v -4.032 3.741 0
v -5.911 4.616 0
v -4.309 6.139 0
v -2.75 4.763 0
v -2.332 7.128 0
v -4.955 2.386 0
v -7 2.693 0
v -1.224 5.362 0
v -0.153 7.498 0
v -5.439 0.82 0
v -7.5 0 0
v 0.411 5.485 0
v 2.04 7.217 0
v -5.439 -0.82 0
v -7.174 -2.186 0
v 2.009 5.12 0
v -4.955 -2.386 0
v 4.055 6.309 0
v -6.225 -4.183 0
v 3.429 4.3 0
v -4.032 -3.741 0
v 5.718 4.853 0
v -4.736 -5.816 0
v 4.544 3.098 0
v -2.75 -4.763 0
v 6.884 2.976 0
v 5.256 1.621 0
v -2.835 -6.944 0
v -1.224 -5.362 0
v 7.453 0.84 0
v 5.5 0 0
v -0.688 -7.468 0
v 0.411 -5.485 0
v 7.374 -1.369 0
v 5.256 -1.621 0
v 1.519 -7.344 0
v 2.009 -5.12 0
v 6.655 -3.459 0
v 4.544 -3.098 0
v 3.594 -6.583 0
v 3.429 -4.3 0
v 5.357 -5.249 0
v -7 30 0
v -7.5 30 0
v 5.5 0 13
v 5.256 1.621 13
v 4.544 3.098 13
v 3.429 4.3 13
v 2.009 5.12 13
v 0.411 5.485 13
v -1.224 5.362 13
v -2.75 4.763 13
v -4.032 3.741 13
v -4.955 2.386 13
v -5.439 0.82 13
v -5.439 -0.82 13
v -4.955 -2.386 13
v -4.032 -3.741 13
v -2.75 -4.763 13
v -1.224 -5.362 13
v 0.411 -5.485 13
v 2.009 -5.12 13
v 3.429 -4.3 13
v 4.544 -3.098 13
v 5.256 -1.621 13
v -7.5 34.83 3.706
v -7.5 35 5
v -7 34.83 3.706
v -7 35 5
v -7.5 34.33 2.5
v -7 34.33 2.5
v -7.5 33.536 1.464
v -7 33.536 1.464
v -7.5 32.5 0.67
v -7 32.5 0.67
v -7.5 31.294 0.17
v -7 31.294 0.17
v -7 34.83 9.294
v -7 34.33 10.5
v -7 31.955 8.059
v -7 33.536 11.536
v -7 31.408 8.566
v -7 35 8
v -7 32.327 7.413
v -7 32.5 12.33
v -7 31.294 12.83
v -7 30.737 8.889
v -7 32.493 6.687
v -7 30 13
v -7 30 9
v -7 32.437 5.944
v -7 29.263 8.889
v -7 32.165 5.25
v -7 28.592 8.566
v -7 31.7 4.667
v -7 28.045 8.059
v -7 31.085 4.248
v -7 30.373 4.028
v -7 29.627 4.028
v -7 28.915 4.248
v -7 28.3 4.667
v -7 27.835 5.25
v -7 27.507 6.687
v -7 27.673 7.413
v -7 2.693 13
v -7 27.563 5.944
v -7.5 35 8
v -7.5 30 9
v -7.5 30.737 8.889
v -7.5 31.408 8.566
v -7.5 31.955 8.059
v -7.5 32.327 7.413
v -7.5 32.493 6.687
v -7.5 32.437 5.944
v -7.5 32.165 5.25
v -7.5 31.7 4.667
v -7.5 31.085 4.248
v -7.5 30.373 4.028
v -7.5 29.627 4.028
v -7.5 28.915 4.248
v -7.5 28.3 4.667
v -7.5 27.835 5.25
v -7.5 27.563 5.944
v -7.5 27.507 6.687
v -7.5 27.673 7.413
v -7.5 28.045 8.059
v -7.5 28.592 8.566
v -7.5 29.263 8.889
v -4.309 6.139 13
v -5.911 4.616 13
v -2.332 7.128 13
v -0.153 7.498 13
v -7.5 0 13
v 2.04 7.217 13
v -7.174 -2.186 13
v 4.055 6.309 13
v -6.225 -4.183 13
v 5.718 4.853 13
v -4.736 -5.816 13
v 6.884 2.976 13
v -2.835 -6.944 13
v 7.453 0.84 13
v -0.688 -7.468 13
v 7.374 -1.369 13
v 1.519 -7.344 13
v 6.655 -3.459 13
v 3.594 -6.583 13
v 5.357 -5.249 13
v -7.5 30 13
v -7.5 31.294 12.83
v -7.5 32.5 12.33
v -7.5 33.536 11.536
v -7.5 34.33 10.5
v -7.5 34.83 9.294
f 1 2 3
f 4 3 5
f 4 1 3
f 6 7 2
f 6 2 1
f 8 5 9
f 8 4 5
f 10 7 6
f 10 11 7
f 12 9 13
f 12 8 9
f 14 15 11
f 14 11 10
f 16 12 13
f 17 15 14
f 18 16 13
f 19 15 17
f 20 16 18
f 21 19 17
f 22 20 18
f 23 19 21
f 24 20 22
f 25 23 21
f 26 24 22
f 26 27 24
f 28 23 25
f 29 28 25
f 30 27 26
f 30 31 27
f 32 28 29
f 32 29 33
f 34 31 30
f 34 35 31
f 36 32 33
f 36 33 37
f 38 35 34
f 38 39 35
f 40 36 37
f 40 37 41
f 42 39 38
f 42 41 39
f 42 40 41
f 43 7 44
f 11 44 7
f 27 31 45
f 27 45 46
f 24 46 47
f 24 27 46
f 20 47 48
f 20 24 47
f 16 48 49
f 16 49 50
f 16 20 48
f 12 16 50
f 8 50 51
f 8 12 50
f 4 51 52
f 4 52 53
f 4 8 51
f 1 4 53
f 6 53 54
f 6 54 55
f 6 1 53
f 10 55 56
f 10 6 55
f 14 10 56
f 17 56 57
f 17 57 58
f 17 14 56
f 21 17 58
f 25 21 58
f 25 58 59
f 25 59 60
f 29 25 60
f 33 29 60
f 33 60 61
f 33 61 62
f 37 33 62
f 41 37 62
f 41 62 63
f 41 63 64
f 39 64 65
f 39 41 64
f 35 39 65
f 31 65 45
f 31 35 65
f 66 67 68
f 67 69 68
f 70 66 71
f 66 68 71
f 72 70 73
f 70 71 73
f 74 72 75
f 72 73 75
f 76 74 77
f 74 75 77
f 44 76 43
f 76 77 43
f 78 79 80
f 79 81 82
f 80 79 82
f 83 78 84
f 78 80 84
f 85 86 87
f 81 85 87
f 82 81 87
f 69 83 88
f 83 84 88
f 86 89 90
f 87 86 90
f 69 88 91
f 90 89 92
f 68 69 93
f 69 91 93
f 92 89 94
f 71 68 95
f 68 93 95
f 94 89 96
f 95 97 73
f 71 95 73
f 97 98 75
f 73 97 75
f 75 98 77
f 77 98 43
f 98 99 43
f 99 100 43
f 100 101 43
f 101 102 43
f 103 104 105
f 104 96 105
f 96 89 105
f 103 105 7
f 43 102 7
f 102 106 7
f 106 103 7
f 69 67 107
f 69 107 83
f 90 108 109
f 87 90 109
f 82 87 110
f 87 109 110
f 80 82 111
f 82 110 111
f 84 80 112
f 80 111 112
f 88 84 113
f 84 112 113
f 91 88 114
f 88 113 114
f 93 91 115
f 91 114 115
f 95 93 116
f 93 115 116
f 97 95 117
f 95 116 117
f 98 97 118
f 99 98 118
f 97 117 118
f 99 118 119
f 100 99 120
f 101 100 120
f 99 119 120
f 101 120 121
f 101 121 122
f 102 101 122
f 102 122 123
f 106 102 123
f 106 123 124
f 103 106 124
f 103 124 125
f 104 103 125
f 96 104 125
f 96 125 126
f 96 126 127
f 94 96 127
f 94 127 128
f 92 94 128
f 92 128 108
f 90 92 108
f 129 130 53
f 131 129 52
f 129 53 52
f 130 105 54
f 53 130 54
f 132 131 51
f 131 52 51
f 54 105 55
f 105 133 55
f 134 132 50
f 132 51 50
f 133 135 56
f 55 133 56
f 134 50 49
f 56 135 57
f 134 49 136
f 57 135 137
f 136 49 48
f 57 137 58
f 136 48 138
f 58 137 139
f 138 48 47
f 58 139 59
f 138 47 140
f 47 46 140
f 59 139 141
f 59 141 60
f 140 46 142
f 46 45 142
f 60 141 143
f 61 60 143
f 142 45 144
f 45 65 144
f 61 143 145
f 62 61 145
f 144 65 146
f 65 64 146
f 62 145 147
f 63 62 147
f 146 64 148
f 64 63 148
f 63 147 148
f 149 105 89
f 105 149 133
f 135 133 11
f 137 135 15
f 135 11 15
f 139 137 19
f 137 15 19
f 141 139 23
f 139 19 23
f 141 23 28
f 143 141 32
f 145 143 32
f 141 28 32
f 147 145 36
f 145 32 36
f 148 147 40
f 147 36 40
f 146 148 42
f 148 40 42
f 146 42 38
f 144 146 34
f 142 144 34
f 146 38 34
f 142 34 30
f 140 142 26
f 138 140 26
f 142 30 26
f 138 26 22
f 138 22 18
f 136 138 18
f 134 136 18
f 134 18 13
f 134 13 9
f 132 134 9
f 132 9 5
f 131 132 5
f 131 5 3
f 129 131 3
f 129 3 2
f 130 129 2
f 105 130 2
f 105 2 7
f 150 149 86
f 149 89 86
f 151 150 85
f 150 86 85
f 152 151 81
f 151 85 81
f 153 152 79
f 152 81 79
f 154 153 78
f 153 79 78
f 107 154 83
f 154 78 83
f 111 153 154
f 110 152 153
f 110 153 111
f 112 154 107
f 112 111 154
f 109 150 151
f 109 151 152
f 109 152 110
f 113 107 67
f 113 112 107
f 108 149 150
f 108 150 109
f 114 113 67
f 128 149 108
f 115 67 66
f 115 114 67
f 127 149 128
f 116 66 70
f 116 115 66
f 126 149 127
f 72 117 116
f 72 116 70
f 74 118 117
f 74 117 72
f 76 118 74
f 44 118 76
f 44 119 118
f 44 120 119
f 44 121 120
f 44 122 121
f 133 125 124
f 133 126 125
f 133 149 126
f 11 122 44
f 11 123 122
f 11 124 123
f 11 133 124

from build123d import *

# Parameters (mm, degrees)
ESBO_O1_R                = 7.5
ESBO_O1_R_2              = 5.5
RESSALTO_EXTRUS_O1_DEPTH = 13
ESBO_O2_W                = 0.5
ESBO_O2_H                = 13
RESSALTO_EXTRUS_O2_DEPTH = 35
ESBO_O3_R                = 2.5
CORTE_EXTRUS_O1_DEPTH    = 20
FILETE1_R                = 5


with BuildPart() as part:
    # Esboço1 → Ressalto-extrusão1 (new body)
    with BuildSketch(Plane.XY):
        Circle(ESBO_O1_R)
        Circle(ESBO_O1_R_2, mode=Mode.SUBTRACT)
    extrude(amount=RESSALTO_EXTRUS_O1_DEPTH)

    # Esboço2 → Ressalto-extrusão2 (add)
    with BuildSketch(Plane(origin=(0, 0, 0), x_dir=(1, 0, 0), z_dir=(0, 1, 0))):
        with Locations((-7.25, -6.5)):
            Rectangle(ESBO_O2_W, ESBO_O2_H)
    extrude(amount=RESSALTO_EXTRUS_O2_DEPTH)

    # Esboço3 → Corte-extrusão1 (cut)
    with BuildSketch(Plane.ZY.offset(7.5)):
        with Locations((6.5, 30)):
            Circle(ESBO_O3_R)
    extrude(amount=-CORTE_EXTRUS_O1_DEPTH, mode=Mode.SUBTRACT)

    # Filete1
    filete1_edges = [part.edges().sort_by_distance(p)[0] for p in [
        (-7.25, 35, 13),
        (-7.25, 35, 0),
    ]]
    fillet(filete1_edges, radius=FILETE1_R)


solid = part.part
